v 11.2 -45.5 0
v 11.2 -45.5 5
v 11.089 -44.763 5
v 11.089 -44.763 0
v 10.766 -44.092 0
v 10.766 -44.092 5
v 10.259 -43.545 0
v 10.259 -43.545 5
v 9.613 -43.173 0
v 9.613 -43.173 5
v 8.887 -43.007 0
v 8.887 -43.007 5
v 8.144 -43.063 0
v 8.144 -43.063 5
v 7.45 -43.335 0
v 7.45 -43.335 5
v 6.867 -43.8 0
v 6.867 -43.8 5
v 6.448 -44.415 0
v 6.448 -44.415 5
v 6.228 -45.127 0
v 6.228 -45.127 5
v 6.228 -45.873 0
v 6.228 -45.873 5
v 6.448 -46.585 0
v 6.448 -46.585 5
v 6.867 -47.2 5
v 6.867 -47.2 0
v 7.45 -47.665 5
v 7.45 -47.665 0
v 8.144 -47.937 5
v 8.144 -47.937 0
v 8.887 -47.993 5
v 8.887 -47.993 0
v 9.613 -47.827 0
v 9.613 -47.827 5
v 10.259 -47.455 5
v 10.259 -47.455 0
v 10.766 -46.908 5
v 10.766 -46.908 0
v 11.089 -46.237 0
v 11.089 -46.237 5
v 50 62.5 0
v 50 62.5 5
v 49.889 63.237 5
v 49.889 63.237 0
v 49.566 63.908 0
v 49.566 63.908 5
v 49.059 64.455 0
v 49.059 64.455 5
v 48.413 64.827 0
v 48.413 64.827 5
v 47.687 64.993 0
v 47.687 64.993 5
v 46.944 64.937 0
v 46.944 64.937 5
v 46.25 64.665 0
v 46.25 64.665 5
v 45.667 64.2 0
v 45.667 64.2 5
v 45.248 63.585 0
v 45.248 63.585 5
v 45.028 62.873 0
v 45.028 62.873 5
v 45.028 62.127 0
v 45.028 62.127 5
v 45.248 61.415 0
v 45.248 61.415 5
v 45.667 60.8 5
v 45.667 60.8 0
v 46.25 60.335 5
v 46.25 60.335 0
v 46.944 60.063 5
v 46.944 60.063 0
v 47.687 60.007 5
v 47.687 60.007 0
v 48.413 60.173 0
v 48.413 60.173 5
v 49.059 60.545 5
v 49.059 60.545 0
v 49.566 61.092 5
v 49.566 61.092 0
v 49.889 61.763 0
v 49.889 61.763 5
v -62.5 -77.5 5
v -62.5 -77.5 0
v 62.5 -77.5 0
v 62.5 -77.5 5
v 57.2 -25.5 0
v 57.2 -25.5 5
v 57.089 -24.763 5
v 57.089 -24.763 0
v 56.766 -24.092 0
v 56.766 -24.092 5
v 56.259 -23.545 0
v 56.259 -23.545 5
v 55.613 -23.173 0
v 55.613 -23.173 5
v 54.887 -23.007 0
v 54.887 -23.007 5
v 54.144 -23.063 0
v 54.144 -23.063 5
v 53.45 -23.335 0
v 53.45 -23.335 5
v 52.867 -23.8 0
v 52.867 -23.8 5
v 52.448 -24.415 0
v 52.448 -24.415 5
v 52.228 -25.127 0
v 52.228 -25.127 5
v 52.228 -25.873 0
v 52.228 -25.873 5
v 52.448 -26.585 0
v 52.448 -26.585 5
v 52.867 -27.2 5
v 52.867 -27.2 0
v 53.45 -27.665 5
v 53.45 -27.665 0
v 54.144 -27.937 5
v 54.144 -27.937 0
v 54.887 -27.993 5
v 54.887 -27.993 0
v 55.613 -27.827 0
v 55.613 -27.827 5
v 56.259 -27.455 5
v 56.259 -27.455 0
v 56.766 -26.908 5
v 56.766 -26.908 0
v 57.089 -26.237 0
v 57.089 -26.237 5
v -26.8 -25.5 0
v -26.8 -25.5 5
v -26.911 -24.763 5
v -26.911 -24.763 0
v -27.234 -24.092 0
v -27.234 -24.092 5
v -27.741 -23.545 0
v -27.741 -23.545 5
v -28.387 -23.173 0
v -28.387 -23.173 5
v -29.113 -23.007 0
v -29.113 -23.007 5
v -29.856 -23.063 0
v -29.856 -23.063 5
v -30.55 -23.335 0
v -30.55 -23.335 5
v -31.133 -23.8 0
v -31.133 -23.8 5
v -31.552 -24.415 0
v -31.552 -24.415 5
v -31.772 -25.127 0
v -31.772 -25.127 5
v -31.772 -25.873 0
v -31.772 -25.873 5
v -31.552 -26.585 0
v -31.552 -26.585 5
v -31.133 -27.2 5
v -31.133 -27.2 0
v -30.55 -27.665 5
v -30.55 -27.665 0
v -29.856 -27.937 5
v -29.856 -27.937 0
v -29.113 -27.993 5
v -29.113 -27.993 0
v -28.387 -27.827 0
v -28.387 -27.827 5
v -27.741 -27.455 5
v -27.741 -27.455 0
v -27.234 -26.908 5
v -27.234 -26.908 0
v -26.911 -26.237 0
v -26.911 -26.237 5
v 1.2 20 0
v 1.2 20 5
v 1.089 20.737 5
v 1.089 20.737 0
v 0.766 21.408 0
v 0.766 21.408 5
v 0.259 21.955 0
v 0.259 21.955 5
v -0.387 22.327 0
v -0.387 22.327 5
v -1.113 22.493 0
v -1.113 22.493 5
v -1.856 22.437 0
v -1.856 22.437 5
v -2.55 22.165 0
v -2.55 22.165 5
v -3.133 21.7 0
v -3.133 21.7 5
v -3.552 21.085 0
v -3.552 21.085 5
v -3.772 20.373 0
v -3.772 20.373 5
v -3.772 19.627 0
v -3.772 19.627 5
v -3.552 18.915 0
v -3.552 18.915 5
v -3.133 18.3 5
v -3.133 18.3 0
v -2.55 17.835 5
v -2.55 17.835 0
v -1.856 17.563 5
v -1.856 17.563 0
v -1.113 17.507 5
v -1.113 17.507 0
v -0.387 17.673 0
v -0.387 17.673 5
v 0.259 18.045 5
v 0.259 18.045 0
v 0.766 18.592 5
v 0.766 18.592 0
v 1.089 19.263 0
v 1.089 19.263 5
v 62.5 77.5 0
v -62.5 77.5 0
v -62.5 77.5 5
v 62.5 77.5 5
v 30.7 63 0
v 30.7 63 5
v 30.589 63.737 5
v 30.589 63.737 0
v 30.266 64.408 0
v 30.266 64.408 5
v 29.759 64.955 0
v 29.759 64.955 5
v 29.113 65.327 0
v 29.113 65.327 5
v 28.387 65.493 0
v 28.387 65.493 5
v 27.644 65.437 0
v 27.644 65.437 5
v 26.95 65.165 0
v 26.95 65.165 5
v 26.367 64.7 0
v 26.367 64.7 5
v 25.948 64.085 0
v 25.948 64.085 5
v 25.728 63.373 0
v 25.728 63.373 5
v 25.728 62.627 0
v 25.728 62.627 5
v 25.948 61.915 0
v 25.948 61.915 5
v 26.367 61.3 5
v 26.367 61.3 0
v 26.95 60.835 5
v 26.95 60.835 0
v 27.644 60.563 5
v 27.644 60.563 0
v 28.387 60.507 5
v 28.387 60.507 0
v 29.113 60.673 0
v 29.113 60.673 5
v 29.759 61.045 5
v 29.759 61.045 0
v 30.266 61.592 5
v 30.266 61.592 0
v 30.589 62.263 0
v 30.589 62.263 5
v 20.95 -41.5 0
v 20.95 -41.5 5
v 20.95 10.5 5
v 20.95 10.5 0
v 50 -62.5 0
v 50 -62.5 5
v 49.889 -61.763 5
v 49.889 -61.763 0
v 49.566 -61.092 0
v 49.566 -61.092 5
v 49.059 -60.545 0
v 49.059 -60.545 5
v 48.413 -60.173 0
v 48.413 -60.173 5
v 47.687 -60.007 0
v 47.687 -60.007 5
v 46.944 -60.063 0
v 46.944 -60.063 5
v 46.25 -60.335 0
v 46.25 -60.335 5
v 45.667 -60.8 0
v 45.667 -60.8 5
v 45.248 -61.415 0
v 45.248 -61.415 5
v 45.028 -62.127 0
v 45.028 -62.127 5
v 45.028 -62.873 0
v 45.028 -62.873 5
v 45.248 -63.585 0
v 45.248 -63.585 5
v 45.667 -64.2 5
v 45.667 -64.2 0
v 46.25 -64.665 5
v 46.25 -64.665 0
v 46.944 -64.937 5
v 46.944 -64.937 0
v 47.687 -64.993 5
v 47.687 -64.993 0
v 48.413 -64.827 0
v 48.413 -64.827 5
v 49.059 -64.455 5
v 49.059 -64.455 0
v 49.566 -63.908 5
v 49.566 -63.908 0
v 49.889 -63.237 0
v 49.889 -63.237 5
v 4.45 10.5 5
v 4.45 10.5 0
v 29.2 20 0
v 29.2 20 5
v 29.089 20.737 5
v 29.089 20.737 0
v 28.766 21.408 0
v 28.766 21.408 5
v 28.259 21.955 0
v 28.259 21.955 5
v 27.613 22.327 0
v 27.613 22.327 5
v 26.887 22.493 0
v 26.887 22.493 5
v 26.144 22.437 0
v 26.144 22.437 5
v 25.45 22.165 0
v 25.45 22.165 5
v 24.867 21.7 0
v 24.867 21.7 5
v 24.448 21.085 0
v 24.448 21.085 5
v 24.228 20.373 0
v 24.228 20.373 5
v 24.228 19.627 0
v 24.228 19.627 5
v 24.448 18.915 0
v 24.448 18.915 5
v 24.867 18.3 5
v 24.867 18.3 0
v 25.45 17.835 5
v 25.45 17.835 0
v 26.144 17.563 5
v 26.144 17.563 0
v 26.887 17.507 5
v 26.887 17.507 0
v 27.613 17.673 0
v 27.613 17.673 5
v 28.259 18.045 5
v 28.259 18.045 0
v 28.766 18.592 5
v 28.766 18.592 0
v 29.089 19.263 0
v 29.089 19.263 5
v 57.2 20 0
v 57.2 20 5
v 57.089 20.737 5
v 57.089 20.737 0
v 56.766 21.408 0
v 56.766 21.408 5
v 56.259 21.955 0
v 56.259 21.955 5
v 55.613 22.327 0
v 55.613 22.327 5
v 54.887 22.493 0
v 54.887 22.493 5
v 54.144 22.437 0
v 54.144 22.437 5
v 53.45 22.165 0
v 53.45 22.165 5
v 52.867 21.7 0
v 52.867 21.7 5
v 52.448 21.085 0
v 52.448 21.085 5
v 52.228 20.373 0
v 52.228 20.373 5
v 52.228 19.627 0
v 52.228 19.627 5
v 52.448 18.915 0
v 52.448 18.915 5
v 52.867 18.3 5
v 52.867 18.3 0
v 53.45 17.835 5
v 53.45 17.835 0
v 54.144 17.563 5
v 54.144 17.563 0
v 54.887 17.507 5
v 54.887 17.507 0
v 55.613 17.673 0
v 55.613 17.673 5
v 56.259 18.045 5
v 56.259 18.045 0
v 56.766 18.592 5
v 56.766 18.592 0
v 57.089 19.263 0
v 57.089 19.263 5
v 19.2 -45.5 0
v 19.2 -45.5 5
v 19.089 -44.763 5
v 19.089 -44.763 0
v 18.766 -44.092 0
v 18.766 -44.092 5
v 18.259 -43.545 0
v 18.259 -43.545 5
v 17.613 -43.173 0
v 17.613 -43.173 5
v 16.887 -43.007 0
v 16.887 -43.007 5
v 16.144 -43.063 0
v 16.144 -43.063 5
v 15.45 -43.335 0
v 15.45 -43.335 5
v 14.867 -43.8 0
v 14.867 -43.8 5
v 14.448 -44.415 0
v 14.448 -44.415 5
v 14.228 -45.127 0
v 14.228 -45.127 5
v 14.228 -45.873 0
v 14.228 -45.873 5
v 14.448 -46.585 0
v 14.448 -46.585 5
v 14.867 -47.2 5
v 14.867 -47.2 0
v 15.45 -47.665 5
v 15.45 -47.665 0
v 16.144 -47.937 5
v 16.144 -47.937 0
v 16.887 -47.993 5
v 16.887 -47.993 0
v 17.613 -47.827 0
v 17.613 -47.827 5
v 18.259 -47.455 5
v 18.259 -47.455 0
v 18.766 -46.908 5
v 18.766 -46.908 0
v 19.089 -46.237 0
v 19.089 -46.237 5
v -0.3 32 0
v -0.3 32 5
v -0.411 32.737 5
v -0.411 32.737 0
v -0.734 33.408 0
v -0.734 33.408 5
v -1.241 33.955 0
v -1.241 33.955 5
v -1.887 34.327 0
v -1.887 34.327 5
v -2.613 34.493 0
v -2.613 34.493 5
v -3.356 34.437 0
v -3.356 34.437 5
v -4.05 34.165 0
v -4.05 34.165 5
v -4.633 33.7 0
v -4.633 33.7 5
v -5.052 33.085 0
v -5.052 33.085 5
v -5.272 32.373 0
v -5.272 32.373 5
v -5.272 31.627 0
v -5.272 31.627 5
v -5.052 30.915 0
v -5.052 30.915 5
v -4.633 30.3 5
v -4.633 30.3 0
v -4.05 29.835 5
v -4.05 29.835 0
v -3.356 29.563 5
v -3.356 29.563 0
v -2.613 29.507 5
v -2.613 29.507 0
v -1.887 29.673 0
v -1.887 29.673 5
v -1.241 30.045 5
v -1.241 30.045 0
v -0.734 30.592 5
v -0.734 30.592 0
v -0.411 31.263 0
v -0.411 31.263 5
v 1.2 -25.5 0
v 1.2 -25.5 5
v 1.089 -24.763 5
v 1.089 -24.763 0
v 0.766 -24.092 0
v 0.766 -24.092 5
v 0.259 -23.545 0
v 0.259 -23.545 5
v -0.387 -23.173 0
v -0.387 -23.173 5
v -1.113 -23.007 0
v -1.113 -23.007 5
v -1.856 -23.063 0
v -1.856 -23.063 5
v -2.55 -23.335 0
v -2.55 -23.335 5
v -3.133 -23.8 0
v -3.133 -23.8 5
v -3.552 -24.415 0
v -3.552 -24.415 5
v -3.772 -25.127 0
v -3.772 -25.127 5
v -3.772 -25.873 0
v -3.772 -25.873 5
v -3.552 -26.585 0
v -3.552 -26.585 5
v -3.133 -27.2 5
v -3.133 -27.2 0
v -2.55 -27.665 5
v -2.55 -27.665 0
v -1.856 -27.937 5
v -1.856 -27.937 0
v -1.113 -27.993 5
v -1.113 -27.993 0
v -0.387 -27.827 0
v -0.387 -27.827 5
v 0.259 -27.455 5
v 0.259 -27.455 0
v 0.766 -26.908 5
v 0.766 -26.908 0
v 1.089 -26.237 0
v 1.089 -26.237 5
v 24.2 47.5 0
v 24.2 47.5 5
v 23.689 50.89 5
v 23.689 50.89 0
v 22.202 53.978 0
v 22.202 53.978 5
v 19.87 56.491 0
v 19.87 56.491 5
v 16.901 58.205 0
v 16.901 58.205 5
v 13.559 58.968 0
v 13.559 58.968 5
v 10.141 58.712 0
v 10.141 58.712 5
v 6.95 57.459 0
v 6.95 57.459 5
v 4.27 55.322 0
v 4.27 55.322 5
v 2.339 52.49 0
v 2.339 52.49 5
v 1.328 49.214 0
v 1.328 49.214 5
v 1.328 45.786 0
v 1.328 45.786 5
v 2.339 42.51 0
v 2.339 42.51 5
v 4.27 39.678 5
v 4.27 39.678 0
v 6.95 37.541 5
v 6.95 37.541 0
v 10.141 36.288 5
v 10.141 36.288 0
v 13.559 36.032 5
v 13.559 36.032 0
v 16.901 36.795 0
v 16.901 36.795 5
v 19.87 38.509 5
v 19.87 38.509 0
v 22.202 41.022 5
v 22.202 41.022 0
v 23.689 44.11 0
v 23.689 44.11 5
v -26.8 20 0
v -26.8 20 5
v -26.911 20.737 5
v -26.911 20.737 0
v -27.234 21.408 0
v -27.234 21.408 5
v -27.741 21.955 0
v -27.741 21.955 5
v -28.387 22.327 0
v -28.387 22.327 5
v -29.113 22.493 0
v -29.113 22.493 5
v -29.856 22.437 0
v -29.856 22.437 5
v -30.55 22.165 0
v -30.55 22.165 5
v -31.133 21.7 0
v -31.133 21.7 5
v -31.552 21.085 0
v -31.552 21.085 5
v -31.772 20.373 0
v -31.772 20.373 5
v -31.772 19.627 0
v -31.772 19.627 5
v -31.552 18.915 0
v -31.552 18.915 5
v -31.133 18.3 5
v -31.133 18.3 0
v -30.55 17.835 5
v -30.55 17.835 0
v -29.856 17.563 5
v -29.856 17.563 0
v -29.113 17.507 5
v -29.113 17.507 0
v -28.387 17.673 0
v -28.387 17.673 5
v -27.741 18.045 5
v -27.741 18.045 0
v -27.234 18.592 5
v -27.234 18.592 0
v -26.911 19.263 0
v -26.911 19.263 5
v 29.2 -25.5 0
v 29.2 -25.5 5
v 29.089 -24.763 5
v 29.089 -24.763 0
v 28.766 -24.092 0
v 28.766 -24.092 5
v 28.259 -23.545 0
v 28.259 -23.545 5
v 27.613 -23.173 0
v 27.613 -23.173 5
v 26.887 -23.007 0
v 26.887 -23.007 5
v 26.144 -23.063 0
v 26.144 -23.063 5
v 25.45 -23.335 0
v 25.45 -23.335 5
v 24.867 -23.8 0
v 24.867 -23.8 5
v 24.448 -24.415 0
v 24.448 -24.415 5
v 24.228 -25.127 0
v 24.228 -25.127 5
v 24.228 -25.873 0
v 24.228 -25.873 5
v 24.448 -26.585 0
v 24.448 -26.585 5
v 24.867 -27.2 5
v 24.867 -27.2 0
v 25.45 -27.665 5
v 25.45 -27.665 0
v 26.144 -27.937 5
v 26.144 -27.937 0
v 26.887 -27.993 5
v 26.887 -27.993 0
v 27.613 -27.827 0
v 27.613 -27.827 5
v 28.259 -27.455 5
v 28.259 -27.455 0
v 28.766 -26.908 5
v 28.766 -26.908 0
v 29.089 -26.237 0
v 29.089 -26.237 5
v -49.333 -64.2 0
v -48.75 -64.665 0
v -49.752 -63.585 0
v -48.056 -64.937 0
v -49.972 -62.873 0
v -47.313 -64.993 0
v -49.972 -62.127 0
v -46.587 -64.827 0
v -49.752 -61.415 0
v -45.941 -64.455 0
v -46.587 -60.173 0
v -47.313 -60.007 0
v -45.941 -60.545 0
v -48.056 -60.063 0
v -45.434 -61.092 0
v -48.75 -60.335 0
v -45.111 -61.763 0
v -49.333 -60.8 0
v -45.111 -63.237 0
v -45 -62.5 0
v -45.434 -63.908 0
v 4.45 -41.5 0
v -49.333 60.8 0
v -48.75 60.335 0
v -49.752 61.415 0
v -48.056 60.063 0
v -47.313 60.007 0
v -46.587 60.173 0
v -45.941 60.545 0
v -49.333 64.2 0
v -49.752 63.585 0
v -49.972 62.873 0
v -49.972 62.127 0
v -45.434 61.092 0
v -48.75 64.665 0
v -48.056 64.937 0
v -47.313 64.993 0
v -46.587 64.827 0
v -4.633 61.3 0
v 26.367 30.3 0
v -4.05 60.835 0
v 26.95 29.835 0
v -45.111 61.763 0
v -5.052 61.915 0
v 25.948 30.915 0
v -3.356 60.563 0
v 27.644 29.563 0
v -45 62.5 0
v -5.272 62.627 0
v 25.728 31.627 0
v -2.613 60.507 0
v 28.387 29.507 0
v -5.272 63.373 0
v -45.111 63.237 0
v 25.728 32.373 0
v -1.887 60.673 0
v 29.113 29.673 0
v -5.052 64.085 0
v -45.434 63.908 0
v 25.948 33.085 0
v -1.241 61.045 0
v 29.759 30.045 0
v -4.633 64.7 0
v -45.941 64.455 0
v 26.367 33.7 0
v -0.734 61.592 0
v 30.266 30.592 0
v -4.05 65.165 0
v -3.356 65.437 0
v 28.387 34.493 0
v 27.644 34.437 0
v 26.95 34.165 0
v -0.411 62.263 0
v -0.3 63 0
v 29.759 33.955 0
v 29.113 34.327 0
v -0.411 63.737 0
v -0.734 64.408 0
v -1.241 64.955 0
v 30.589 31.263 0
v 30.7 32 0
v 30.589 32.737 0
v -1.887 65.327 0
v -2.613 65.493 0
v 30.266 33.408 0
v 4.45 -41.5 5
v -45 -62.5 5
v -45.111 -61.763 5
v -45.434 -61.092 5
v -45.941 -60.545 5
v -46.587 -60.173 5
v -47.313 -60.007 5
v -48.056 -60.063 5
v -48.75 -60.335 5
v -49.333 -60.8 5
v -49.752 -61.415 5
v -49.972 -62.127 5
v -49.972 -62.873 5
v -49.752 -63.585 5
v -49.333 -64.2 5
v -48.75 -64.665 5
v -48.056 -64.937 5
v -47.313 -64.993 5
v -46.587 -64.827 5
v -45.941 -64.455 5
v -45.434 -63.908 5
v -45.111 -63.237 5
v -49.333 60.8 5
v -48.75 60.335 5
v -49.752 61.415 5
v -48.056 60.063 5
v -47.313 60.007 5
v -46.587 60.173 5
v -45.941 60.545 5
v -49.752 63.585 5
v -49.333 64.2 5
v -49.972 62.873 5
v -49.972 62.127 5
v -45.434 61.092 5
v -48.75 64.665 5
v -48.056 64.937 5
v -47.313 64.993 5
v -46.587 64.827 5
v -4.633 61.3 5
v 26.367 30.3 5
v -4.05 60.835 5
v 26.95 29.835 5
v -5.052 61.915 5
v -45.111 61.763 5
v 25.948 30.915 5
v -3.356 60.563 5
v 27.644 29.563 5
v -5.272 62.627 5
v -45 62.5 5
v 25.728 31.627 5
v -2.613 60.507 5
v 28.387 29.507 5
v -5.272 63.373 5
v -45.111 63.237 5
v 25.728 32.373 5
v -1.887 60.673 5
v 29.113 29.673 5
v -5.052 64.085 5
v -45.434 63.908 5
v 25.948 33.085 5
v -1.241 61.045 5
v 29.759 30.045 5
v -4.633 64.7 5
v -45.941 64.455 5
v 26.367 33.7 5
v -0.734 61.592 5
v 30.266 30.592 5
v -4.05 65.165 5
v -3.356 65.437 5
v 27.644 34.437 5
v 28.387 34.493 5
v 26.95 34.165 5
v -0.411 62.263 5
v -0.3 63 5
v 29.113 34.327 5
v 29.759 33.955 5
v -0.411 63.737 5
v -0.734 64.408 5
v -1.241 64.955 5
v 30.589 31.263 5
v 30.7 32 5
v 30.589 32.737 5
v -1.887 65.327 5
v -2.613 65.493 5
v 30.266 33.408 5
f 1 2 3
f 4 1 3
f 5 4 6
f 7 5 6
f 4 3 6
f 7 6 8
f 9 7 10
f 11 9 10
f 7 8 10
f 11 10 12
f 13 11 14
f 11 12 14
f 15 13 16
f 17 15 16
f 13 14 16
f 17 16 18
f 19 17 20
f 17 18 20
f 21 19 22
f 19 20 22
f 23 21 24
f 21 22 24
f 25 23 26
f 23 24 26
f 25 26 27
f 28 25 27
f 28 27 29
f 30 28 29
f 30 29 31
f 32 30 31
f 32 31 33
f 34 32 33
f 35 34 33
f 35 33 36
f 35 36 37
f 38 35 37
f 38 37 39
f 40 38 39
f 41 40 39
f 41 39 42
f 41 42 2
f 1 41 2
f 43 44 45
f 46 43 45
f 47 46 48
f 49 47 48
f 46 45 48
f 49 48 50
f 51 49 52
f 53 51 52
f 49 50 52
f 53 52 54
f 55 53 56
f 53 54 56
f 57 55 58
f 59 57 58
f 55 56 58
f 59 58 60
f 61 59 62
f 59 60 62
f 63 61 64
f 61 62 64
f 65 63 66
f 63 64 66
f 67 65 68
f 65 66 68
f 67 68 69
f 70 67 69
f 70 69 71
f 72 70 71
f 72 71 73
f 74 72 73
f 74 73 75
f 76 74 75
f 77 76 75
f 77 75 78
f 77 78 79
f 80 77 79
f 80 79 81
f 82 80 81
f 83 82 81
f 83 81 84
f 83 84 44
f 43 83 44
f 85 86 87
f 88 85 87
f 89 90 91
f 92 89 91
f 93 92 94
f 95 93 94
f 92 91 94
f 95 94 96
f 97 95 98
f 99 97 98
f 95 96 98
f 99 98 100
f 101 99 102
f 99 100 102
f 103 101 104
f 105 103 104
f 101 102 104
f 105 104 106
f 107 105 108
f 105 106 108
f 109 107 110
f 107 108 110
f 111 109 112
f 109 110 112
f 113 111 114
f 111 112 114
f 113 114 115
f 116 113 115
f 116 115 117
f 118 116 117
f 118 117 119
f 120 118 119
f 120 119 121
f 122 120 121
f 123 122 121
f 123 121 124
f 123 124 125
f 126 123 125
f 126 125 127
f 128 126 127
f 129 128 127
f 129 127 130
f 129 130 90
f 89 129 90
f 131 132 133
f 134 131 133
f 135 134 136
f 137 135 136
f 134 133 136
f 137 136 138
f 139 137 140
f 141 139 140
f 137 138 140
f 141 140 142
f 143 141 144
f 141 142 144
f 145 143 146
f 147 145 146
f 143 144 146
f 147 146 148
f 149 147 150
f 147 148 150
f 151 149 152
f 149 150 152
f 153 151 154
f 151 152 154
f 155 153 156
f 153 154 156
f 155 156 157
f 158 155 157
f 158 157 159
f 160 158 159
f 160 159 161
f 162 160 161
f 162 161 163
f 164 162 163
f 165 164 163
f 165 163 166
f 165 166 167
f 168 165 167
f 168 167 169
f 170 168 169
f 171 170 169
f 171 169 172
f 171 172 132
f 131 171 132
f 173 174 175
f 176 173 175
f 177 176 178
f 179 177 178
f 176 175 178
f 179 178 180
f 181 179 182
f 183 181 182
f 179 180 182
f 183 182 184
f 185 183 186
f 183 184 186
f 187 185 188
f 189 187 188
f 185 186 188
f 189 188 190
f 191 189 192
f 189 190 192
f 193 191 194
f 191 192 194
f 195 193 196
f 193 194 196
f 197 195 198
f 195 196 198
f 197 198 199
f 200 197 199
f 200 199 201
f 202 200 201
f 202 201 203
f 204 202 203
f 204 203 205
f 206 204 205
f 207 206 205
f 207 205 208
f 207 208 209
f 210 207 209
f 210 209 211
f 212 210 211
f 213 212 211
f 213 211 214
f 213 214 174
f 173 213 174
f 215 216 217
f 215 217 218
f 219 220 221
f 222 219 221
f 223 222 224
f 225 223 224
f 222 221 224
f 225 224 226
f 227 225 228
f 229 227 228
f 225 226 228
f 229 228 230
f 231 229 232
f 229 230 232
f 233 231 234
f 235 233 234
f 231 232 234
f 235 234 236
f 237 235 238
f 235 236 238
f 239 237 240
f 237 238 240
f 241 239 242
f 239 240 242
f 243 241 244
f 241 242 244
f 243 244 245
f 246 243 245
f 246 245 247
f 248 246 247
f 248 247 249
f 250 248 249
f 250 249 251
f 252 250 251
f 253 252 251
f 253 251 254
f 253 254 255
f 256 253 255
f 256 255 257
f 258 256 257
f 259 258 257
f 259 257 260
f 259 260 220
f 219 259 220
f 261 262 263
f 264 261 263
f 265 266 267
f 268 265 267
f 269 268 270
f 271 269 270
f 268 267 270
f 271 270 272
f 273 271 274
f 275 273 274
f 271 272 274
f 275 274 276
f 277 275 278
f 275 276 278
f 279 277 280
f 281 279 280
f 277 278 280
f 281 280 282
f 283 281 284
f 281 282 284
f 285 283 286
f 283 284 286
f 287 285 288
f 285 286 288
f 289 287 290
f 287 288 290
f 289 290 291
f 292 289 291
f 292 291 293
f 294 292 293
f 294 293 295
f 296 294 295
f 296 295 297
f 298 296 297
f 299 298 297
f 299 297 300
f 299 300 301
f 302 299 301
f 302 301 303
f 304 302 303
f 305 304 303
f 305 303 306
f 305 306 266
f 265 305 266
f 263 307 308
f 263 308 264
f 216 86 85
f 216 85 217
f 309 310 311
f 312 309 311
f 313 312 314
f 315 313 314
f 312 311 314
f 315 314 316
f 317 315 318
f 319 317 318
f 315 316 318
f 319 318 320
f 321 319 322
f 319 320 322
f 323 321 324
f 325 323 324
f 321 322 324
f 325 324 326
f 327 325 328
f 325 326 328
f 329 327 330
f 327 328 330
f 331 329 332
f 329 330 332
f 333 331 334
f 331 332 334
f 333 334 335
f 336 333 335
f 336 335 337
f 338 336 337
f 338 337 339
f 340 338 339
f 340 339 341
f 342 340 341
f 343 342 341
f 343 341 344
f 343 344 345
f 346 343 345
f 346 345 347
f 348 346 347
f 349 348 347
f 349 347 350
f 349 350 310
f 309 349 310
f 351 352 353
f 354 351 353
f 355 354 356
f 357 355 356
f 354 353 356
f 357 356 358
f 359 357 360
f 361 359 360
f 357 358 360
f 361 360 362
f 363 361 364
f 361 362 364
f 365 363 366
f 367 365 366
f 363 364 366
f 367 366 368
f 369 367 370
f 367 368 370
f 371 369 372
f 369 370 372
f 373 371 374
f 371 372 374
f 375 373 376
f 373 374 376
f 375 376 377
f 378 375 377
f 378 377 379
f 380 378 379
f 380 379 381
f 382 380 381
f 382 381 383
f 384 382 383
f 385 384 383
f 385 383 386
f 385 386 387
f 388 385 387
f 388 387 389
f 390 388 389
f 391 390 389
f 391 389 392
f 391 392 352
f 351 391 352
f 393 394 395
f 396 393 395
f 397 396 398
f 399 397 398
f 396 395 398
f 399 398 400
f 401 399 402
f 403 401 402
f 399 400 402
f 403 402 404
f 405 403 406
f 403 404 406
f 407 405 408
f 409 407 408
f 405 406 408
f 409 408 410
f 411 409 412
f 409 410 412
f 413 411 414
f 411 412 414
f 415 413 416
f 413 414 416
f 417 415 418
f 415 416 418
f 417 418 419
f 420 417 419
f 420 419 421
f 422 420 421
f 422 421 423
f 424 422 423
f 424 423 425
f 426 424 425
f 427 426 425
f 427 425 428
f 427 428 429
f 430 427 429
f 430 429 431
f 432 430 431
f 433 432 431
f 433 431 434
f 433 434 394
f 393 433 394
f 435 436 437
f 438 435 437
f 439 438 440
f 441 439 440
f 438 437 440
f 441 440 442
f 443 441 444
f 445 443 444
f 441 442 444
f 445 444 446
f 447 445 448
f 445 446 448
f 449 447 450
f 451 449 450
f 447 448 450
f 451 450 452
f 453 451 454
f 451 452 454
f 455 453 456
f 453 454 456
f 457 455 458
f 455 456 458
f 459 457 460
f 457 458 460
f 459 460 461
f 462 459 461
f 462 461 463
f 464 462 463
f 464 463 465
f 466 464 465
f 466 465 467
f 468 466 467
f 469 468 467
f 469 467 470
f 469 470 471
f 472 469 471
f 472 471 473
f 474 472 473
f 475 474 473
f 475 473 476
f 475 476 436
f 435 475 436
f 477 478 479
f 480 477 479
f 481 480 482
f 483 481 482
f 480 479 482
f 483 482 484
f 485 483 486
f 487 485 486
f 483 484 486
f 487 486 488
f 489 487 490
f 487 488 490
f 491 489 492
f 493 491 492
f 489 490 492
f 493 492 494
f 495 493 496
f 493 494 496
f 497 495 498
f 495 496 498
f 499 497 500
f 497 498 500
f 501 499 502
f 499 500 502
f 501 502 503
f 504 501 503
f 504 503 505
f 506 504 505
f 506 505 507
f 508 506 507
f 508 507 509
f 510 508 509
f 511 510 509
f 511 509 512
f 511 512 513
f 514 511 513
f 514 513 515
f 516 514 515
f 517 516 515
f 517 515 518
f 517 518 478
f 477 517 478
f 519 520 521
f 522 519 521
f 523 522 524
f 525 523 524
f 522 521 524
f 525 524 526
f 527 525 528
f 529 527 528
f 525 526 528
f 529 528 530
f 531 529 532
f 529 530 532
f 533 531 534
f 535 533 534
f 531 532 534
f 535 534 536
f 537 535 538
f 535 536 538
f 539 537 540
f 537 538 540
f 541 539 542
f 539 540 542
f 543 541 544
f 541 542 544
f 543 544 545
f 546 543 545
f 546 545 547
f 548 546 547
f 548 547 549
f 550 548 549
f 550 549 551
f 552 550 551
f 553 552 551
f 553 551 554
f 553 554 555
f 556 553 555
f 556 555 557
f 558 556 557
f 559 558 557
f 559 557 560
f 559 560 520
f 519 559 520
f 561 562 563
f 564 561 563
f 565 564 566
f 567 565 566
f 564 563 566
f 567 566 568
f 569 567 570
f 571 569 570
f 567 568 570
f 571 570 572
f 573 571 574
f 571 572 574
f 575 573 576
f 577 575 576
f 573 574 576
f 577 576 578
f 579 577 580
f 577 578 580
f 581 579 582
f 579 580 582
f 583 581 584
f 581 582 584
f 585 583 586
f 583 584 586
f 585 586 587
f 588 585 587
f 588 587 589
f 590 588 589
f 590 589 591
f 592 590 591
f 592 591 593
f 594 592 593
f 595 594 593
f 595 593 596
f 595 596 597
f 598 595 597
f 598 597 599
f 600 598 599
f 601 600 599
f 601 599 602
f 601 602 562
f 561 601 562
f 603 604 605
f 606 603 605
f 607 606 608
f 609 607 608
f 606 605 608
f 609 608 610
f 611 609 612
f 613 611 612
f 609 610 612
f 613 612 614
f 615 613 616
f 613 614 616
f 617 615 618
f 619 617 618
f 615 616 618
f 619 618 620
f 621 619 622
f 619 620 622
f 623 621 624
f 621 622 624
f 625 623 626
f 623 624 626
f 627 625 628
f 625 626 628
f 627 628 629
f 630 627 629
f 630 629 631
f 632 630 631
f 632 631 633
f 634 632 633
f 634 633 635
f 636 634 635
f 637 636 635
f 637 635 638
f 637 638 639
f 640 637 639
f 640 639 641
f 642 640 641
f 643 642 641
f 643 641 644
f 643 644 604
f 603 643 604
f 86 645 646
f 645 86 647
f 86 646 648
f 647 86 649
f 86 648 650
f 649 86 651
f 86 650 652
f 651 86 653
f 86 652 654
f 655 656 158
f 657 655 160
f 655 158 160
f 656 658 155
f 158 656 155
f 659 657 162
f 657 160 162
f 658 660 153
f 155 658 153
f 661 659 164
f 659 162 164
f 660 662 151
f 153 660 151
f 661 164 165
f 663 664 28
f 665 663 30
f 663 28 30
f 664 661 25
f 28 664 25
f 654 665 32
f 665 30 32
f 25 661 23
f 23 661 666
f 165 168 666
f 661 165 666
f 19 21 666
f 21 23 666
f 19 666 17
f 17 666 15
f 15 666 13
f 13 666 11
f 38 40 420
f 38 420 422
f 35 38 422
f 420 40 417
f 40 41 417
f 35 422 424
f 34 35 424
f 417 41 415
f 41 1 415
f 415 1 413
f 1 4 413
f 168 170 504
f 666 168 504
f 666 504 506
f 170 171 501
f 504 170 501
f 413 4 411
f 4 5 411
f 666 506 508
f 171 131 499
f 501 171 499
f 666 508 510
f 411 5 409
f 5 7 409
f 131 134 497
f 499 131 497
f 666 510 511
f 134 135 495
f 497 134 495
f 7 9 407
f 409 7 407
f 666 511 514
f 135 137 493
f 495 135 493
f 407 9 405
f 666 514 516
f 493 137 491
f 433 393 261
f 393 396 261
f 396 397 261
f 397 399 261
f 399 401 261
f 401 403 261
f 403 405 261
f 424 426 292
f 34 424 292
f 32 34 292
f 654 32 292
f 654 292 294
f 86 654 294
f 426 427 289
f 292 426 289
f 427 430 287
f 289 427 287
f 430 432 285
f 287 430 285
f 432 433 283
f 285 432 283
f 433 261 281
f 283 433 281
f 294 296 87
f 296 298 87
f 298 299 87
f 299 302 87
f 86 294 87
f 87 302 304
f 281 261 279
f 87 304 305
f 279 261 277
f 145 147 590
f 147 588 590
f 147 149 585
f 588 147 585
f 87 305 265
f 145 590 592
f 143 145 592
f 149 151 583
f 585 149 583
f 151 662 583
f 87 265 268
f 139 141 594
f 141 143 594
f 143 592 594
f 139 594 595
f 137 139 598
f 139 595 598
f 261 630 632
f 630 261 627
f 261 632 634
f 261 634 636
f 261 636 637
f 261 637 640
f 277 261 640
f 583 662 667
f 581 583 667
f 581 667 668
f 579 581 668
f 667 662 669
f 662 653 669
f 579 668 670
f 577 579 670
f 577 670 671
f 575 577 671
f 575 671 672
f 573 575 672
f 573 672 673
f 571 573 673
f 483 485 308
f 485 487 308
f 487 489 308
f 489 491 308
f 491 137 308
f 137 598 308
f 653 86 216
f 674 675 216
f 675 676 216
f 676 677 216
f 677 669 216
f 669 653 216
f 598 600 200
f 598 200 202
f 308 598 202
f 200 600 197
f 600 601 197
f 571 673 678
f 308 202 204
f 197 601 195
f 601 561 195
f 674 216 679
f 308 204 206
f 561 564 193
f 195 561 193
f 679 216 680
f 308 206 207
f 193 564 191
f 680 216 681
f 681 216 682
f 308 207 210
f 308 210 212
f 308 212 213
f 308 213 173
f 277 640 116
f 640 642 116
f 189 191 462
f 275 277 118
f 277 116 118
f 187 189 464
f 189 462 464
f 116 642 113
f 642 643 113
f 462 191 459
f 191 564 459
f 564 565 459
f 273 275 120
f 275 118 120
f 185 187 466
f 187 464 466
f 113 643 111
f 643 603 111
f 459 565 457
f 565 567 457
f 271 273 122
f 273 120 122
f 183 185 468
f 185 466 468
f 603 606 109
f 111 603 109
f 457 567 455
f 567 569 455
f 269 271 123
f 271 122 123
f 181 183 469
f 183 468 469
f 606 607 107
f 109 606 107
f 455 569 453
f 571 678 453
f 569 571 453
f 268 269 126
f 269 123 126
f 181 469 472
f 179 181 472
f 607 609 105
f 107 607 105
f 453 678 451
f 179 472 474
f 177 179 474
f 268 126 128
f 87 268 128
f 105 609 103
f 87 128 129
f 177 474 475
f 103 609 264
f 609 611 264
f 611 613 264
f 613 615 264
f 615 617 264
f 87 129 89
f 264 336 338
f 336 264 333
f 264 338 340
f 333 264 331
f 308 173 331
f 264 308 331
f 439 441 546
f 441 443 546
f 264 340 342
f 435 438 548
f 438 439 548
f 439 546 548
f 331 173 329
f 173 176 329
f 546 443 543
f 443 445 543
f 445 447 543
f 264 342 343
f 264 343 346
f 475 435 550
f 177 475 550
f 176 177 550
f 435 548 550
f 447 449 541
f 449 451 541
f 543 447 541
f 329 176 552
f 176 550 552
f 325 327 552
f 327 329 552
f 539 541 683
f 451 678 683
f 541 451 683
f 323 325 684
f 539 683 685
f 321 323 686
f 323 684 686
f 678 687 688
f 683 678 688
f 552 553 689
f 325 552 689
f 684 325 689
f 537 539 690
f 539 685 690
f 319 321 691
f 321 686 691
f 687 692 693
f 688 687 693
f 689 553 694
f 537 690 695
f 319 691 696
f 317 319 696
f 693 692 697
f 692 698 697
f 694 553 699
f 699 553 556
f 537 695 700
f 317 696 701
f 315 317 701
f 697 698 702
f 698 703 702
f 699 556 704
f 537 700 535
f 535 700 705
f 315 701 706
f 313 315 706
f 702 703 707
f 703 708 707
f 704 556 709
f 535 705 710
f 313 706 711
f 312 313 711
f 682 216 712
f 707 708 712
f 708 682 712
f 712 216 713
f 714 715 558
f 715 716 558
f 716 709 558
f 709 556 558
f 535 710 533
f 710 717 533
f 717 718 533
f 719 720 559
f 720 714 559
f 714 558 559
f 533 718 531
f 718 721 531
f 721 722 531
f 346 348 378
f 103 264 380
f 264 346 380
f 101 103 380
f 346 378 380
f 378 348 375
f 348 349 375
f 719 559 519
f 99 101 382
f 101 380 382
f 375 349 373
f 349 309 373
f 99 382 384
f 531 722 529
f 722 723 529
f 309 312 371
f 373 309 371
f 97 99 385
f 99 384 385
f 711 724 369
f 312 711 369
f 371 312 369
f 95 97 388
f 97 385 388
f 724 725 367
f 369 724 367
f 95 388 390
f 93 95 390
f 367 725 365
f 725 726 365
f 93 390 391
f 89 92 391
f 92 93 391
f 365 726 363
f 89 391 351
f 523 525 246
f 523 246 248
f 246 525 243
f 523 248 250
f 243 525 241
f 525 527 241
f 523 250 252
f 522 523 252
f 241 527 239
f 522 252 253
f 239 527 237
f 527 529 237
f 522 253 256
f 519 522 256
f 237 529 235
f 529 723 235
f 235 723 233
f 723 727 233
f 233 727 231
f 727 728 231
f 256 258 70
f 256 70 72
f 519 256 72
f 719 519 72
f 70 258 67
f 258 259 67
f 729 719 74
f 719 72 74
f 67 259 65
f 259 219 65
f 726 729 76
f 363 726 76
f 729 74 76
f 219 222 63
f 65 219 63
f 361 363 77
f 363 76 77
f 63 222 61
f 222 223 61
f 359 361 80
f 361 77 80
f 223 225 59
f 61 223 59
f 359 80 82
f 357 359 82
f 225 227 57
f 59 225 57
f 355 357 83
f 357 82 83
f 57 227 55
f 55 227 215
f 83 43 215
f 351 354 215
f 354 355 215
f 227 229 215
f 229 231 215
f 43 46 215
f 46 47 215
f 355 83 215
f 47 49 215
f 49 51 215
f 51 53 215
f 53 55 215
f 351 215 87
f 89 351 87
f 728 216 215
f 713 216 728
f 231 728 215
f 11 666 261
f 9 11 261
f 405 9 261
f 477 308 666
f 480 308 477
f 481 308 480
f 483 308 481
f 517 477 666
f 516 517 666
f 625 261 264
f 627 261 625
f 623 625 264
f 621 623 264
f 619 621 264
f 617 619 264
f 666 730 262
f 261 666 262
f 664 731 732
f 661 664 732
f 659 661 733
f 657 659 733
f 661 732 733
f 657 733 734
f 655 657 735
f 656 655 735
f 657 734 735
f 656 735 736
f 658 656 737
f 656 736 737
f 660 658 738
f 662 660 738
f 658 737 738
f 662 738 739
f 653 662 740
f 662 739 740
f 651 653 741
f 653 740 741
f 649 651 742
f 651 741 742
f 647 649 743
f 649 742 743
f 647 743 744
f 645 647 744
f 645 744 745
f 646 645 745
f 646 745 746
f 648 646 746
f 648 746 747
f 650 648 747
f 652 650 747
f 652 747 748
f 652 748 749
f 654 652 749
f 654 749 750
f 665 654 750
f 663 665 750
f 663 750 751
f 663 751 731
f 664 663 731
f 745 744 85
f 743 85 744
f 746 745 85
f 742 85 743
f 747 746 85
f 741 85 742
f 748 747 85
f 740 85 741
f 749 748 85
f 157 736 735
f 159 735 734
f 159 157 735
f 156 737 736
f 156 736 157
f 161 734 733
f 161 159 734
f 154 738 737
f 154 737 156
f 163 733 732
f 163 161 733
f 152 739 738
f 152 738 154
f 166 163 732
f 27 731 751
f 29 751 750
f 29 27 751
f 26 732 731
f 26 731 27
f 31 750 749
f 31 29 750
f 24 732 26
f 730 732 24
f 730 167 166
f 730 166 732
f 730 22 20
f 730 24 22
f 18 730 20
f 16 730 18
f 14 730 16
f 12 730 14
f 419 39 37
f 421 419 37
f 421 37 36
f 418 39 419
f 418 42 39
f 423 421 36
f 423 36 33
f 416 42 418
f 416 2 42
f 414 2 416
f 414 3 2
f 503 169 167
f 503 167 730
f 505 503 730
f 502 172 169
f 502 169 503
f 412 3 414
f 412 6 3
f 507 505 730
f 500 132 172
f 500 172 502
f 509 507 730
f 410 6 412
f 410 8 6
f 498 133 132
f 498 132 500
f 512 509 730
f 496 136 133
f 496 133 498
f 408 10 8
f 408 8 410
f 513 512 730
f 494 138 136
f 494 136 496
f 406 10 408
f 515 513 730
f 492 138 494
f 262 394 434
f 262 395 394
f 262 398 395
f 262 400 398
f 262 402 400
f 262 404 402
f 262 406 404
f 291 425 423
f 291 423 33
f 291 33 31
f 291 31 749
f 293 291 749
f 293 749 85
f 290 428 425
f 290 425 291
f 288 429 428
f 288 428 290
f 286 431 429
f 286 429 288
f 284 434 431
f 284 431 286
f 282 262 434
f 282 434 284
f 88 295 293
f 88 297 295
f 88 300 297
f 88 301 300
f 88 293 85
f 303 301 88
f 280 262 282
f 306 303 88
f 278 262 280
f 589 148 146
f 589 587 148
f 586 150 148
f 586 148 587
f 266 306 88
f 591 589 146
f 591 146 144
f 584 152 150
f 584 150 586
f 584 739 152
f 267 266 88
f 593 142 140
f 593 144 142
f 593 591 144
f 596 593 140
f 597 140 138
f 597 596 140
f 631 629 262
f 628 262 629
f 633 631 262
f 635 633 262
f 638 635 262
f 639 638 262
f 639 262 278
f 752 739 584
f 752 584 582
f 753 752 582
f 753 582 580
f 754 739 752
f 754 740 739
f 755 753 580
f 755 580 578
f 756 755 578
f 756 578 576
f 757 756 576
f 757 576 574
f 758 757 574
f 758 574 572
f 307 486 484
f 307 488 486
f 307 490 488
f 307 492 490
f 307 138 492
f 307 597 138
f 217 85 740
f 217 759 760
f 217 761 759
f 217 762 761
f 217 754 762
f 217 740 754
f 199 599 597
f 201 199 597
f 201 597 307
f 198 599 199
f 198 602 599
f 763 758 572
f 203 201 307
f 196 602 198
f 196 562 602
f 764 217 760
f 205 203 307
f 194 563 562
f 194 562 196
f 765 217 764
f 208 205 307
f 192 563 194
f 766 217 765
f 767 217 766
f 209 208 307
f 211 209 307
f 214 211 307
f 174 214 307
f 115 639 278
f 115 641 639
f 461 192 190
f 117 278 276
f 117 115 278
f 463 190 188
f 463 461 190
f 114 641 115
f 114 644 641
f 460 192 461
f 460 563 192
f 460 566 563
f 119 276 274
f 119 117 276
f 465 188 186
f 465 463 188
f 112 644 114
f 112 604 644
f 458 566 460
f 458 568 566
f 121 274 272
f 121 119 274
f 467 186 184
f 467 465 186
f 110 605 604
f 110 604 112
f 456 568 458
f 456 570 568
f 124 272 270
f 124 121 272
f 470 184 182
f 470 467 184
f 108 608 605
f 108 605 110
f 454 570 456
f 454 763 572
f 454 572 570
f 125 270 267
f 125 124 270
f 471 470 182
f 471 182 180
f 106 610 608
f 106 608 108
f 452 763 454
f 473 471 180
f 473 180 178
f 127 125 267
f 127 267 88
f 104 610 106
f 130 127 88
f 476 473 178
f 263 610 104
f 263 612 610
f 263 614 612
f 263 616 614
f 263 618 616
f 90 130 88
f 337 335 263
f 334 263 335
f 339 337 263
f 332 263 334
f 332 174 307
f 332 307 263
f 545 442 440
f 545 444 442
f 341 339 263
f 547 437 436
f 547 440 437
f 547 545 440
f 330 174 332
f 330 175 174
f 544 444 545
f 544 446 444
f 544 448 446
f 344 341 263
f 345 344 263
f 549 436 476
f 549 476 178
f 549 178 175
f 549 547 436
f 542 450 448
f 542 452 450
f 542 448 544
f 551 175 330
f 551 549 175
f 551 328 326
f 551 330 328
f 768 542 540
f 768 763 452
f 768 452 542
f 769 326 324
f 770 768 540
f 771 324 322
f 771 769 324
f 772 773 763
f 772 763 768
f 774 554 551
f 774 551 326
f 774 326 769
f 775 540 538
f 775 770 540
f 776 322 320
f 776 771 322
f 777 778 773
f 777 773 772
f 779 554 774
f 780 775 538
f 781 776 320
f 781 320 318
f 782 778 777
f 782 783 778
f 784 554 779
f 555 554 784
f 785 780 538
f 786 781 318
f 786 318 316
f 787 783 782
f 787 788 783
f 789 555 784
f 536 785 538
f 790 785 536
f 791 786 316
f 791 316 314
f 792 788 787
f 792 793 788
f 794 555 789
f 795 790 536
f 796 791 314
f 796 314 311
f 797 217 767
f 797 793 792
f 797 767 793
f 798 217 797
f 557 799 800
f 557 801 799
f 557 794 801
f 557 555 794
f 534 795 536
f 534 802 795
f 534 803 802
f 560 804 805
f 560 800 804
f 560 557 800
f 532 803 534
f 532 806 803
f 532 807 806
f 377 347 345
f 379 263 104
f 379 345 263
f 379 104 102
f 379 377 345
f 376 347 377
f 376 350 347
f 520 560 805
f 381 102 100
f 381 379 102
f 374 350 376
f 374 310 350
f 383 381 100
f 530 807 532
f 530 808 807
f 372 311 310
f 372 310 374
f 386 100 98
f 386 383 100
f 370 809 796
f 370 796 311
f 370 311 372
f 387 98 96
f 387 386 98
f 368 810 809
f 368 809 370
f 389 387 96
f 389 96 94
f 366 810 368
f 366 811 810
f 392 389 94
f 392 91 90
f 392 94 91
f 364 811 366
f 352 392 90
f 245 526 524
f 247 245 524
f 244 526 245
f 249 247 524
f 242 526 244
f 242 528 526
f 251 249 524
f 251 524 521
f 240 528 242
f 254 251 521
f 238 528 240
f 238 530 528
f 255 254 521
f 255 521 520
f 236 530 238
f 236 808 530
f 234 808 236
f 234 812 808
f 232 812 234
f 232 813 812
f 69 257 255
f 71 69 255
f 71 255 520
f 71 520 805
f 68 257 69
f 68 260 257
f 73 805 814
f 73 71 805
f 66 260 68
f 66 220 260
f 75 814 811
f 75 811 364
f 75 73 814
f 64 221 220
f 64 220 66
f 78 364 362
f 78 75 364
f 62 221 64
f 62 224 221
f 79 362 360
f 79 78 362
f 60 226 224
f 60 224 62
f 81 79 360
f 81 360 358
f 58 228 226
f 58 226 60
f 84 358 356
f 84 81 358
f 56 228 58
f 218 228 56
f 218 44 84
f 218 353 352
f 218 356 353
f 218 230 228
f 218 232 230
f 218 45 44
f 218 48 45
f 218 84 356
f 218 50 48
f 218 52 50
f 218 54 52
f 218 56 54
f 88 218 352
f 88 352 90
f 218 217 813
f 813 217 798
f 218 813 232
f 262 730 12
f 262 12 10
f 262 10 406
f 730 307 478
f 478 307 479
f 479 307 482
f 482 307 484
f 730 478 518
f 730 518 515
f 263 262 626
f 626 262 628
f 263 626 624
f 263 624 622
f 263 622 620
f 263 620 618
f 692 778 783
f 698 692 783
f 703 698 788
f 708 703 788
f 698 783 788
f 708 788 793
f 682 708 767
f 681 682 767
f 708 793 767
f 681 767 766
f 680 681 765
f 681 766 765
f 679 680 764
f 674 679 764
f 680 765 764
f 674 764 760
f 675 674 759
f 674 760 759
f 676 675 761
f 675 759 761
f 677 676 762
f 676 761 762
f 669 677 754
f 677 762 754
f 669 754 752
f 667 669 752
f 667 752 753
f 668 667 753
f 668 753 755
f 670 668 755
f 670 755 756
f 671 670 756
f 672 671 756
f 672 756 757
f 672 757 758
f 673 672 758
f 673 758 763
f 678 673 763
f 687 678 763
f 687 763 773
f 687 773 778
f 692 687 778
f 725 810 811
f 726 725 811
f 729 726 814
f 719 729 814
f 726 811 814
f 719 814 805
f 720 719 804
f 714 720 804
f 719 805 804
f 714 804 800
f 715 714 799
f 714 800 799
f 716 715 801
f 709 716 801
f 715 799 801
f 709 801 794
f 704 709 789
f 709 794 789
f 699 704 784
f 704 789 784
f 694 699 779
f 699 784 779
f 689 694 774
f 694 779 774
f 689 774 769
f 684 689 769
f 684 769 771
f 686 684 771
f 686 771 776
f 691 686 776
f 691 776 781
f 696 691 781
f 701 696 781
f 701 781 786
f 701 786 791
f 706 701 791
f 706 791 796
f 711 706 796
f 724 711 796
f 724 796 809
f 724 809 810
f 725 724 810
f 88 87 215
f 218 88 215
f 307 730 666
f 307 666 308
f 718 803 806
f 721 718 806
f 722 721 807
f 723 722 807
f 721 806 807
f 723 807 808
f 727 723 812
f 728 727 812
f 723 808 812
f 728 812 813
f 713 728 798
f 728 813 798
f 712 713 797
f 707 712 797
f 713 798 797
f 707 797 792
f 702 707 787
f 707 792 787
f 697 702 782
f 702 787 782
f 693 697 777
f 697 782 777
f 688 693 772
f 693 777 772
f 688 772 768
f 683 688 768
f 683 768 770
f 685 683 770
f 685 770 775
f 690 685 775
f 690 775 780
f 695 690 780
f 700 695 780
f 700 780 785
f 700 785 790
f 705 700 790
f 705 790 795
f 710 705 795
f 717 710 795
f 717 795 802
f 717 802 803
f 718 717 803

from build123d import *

# Parameters (mm, degrees)
SKETCH_W        = 125
SKETCH_H        = 155
PAD_DEPTH       = 5
SKETCH001_R     = 2.5
POCKET_DEPTH    = 5.001
SKETCH002_W     = 16.5
SKETCH002_H     = 52
POCKET001_DEPTH = 5.001
SKETCH003_R     = 11.5
SKETCH003_R_2   = 2.5
POCKET002_DEPTH = 5.001
SKETCH004_R     = 2.5
POCKET003_DEPTH = 5.001
SKETCH005_R     = 2.5
POCKET004_DEPTH = 5.001


with BuildPart() as part:
    # Sketch → Pad (new body)
    with BuildSketch(Plane.XY):
        Rectangle(SKETCH_W, SKETCH_H)
    extrude(amount=PAD_DEPTH)

    # Sketch001 (on Face6 of Pad) → Pocket (cut, through all)
    with BuildSketch(Plane.XY.offset(5)):
        with Locations((-47.5, 62.5)):
            Circle(SKETCH001_R)
        with Locations((47.5, 62.5)):
            Circle(SKETCH001_R)
        with Locations((-47.5, -62.5)):
            Circle(SKETCH001_R)
        with Locations((47.5, -62.5)):
            Circle(SKETCH001_R)
    extrude(amount=-POCKET_DEPTH, mode=Mode.SUBTRACT)

    # Sketch002 (on Face5 of Pocket) → Pocket001 (cut, through all)
    with BuildSketch(Plane.XY.offset(5)):
        with Locations((12.7, -15.5)):
            Rectangle(SKETCH002_W, SKETCH002_H)
    extrude(amount=-POCKET001_DEPTH, mode=Mode.SUBTRACT)

    # Sketch003 (on Face5 of Pocket001) → Pocket002 (cut, through all)
    with BuildSketch(Plane.XY.offset(5)):
        with Locations((12.7, 47.5)):
            Circle(SKETCH003_R)
        with Locations((-2.8, 63)):
            Circle(SKETCH003_R_2)
        with Locations((28.2, 63)):
            Circle(SKETCH003_R_2)
        with Locations((28.2, 32)):
            Circle(SKETCH003_R_2)
        with Locations((-2.8, 32)):
            Circle(SKETCH003_R_2)
    extrude(amount=-POCKET002_DEPTH, mode=Mode.SUBTRACT)

    # Sketch004 (on Face5 of Pocket002) → Pocket003 (cut, through all)
    with BuildSketch(Plane.XY.offset(5)):
        with Locations((8.7, -45.5)):
            Circle(SKETCH004_R)
        with Locations((16.7, -45.5)):
            Circle(SKETCH004_R)
    extrude(amount=-POCKET003_DEPTH, mode=Mode.SUBTRACT)

    # Sketch005 (on Face5 of Pocket003) → Pocket004 (cut, through all)
    with BuildSketch(Plane.XY.offset(5)):
        with Locations((26.7, 20)):
            Circle(SKETCH005_R)
        with Locations((54.7, 20)):
            Circle(SKETCH005_R)
        with Locations((26.7, -25.5)):
            Circle(SKETCH005_R)
        with Locations((54.7, -25.5)):
            Circle(SKETCH005_R)
        with Locations((-1.3, 20)):
            Circle(SKETCH005_R)
        with Locations((-29.3, 20)):
            Circle(SKETCH005_R)
        with Locations((-29.3, -25.5)):
            Circle(SKETCH005_R)
        with Locations((-1.3, -25.5)):
            Circle(SKETCH005_R)
    extrude(amount=-POCKET004_DEPTH, mode=Mode.SUBTRACT)


solid = part.part
